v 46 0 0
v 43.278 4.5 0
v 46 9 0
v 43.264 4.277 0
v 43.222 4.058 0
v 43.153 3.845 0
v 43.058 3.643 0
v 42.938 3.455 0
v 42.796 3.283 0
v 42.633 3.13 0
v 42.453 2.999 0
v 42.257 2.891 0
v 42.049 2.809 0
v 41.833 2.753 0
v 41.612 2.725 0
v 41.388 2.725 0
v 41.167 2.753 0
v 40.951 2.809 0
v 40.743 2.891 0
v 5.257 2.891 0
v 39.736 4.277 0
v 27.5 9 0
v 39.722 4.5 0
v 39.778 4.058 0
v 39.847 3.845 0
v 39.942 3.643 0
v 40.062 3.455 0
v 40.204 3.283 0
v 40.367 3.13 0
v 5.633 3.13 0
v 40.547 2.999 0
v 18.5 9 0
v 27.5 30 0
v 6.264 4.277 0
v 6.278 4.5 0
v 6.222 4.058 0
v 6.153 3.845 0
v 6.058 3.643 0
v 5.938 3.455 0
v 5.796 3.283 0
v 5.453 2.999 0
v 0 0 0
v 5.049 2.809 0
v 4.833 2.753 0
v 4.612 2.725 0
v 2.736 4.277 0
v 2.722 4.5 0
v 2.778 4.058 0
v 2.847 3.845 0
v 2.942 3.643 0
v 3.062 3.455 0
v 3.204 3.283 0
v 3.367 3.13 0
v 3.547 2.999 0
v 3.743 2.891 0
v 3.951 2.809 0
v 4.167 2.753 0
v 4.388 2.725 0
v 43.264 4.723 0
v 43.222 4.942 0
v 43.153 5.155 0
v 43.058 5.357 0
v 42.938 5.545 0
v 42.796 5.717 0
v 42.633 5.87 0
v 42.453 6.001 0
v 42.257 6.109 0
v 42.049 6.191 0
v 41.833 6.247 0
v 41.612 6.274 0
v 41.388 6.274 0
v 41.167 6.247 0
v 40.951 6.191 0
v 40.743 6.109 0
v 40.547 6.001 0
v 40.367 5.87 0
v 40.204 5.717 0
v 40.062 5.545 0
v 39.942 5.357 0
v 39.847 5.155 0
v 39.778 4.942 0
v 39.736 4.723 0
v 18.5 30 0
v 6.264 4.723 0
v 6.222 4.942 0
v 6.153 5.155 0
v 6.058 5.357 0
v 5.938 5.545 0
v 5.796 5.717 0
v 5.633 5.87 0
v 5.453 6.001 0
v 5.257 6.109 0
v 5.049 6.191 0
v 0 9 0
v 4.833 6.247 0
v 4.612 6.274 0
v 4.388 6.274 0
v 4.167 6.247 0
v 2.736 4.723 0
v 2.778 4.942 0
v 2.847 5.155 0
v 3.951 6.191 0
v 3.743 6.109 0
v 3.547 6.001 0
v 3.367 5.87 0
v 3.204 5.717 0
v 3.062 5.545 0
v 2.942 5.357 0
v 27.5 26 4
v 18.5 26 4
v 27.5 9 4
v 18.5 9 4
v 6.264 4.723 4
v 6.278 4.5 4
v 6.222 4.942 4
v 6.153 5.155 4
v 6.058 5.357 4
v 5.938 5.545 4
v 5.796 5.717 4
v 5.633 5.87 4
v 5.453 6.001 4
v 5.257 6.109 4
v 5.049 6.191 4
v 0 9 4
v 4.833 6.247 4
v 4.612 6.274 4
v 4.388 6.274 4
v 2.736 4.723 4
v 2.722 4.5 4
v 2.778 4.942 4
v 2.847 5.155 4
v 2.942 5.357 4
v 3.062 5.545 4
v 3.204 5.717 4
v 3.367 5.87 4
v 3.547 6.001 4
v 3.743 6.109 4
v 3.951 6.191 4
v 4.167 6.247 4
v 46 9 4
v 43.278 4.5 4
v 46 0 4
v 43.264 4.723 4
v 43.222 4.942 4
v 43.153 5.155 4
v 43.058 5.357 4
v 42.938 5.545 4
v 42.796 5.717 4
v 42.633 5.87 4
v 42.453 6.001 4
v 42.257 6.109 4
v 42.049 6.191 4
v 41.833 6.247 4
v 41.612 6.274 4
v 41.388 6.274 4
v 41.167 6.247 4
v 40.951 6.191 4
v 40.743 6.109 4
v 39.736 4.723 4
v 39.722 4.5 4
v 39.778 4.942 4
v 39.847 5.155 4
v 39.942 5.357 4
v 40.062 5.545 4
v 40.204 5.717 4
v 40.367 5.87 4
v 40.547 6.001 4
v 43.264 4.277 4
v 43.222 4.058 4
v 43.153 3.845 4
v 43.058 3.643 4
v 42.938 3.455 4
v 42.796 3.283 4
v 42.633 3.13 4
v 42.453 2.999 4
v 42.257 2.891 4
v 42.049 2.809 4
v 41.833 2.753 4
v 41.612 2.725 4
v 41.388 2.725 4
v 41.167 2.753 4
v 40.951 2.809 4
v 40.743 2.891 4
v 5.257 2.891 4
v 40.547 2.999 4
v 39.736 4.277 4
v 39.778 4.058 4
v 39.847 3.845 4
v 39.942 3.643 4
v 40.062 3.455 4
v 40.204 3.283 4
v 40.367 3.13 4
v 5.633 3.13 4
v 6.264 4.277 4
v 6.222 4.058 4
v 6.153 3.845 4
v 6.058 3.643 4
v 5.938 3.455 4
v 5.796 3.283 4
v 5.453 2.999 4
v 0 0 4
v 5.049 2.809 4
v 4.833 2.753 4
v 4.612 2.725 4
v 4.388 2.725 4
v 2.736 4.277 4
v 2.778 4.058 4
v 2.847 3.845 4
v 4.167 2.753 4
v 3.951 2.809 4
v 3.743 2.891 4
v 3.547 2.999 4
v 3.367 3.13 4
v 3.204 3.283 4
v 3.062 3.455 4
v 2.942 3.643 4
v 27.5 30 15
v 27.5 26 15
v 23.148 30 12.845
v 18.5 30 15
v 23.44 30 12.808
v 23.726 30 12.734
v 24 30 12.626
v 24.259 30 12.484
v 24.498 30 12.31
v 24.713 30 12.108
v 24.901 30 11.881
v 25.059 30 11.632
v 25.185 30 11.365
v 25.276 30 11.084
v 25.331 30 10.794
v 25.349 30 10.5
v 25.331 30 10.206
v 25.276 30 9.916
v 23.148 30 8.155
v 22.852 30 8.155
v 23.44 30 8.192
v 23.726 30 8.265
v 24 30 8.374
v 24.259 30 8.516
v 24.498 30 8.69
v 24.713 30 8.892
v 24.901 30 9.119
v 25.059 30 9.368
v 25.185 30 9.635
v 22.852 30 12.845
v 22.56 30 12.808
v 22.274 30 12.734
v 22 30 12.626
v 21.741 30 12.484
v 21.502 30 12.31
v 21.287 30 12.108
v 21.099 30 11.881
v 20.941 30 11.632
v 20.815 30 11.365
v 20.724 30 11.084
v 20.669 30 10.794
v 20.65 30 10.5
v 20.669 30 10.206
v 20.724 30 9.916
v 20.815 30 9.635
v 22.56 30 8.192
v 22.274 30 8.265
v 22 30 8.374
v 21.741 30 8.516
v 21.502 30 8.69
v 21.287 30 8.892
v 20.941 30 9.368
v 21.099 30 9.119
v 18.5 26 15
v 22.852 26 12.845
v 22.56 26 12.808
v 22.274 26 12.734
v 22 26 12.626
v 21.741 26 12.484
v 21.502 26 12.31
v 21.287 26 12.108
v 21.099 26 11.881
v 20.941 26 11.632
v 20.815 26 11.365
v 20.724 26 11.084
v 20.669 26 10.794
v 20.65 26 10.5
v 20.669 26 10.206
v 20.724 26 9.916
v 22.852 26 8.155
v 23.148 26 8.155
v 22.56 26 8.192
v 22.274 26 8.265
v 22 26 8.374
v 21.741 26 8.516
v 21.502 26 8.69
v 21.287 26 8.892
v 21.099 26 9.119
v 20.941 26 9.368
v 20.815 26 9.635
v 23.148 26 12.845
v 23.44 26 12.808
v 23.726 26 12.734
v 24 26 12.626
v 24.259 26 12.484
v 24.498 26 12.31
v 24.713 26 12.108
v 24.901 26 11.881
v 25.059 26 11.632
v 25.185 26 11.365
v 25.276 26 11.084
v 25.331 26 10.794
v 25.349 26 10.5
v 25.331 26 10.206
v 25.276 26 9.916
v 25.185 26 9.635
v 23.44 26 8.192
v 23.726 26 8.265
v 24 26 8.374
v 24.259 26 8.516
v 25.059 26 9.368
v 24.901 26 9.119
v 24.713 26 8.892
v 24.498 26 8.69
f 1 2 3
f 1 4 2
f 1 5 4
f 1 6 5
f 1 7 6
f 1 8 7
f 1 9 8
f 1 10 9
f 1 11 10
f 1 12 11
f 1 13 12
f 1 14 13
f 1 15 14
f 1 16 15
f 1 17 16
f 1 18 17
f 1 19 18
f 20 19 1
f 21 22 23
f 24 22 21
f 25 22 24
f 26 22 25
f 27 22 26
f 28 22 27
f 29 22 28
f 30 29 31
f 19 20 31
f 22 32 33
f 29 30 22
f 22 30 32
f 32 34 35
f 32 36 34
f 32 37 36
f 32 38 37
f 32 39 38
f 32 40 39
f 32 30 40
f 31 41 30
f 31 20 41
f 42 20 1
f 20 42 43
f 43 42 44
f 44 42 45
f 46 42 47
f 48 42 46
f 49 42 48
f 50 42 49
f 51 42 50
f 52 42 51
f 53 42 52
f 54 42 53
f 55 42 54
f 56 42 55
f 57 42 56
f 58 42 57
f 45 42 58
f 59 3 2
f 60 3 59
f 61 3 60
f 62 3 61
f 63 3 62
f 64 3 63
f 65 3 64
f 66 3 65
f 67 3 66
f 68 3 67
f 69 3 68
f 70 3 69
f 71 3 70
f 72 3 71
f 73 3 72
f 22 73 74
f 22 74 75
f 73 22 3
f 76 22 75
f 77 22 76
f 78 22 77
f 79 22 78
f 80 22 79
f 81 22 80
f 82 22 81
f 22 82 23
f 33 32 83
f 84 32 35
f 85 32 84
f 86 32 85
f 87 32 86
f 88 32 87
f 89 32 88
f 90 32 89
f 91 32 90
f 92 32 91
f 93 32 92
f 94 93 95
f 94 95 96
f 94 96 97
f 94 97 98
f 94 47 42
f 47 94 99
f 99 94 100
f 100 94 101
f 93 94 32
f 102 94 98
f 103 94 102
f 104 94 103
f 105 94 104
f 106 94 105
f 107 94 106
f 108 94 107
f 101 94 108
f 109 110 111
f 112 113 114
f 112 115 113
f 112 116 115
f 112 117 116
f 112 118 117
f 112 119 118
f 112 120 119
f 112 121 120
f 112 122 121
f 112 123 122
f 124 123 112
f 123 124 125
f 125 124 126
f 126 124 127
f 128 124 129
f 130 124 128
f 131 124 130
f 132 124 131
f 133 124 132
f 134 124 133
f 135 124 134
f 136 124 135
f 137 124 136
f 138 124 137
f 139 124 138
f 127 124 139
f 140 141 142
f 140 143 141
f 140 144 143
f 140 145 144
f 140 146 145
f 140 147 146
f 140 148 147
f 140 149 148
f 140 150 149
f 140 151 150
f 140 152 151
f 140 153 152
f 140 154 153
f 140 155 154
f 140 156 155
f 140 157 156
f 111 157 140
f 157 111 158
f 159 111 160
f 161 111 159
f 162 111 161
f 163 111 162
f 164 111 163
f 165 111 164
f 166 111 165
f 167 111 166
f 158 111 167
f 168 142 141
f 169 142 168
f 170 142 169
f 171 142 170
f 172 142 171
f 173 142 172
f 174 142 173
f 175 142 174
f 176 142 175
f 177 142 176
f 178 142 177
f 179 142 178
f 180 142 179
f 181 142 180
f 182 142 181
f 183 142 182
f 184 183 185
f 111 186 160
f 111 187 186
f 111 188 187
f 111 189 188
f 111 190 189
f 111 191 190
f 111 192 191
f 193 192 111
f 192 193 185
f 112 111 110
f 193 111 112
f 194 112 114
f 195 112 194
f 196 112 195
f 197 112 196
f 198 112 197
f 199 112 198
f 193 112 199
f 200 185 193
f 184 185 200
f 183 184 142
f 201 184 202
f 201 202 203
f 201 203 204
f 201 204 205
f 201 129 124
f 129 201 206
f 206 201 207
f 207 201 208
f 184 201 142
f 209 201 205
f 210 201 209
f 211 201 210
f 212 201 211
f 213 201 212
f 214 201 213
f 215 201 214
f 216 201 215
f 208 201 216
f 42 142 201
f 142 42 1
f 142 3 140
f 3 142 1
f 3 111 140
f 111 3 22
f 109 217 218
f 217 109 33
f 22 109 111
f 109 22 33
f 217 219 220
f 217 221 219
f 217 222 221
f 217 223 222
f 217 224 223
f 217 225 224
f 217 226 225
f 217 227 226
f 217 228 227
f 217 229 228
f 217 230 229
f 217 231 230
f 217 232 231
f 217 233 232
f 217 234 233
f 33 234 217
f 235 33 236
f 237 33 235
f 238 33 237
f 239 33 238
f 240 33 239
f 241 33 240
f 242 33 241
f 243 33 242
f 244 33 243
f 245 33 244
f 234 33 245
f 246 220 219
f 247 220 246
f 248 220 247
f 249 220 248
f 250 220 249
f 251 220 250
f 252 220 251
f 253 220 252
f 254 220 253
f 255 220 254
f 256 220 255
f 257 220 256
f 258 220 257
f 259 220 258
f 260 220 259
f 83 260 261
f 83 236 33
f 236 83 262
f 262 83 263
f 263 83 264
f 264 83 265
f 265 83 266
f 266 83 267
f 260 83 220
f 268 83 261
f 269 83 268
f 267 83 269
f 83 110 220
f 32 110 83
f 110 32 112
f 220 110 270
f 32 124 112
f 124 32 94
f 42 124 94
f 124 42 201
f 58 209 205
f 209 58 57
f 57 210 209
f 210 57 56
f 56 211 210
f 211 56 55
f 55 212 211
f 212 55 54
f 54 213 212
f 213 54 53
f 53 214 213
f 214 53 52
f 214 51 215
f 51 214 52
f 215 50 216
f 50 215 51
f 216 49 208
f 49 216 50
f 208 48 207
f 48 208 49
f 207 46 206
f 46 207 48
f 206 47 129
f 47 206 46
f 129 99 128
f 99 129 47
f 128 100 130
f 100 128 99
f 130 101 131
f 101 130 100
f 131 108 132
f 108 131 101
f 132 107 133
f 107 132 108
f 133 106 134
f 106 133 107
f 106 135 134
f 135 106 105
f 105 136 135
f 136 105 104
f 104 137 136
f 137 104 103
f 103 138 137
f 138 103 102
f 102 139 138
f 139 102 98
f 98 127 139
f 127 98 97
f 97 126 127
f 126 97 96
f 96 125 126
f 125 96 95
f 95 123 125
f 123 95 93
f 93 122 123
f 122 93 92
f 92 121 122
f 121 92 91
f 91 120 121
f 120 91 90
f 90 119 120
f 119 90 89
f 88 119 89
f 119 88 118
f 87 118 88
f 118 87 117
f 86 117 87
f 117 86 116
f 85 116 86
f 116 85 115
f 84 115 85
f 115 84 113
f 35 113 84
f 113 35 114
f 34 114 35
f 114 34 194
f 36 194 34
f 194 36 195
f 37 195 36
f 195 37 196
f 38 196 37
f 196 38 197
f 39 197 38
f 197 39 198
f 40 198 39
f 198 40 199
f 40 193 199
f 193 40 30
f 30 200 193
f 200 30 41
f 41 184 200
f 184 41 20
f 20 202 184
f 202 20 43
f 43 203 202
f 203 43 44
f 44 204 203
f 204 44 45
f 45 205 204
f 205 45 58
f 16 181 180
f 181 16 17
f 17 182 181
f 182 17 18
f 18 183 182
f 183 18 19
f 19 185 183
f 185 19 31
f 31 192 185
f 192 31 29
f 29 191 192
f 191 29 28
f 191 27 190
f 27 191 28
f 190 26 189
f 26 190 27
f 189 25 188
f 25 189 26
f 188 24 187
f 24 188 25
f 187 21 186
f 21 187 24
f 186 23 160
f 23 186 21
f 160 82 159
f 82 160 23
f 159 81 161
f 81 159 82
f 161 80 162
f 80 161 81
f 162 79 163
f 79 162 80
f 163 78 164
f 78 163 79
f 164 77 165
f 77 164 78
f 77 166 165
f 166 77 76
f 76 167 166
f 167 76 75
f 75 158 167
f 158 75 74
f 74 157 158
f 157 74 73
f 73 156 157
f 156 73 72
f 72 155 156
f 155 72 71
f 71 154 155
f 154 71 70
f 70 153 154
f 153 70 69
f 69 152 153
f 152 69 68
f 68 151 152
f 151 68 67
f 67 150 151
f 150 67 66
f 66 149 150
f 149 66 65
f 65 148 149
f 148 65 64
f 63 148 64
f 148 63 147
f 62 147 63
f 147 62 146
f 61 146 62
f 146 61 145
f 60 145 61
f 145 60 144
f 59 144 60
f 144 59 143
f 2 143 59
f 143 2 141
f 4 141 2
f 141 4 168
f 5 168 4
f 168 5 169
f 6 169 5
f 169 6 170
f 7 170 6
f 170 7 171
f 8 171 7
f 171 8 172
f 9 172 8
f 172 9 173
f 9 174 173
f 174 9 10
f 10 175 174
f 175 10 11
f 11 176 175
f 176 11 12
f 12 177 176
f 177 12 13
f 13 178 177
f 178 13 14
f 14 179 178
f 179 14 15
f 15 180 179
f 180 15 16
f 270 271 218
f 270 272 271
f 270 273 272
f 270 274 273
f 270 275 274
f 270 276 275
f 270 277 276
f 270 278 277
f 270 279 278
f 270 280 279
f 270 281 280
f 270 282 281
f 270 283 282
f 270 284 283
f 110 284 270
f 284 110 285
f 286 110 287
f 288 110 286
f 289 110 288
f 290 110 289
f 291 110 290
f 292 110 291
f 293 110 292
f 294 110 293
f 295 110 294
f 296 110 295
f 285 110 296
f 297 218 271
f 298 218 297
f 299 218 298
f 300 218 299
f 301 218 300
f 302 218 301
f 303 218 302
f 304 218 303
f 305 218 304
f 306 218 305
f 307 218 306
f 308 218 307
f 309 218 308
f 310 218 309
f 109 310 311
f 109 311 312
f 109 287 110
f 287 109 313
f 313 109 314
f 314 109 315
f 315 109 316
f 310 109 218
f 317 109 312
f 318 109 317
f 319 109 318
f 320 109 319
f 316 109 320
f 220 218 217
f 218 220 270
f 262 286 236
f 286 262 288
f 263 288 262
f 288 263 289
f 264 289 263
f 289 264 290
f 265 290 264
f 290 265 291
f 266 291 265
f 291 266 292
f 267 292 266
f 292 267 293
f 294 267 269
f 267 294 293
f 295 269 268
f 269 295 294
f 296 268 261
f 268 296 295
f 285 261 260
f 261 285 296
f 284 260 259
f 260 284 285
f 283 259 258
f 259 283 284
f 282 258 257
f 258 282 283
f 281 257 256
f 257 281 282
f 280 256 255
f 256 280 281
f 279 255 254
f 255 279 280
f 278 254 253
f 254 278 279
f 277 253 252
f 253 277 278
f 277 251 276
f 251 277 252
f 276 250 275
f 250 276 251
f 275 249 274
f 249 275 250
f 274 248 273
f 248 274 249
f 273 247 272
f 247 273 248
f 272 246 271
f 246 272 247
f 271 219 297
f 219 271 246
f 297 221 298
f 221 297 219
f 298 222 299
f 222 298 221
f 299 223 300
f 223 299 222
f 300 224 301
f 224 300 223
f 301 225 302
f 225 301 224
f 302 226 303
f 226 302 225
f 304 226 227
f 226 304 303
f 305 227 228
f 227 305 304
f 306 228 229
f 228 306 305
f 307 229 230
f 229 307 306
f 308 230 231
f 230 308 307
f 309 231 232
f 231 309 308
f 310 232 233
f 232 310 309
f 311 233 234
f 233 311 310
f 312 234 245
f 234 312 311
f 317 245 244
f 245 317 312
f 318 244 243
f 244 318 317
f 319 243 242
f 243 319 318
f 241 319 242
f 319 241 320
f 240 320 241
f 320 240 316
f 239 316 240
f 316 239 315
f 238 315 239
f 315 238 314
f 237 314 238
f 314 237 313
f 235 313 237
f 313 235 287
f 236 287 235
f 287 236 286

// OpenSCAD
$fn = 50;

inches_to_mm = 25.4;

hole_1_diameter = 0.185*inches_to_mm;
hole_2_diameter = 0.140*inches_to_mm;
sensor_hole_center = 37;
support_height = 9;
sensor_height = 21;
bracket_length = 15;
bracket_thickness = 4;

// -------------------------- part --------------------

distance_sensor_bracket();

// ------------------------- module definition ----------------

module distance_sensor_bracket()
{
  linear_extrude(height = bracket_thickness) union()
  {
    difference()
    {
      square([support_height+sensor_hole_center, support_height]);
      translate([support_height/2, support_height/2]) circle(r=hole_2_diameter/2);
      translate([support_height/2+sensor_hole_center, support_height/2]) circle(r=hole_2_diameter/2);
    }
    
    translate([sensor_hole_center/2, support_height]) square([support_height, sensor_height]);
  }
  
  translate([sensor_hole_center/2, support_height+sensor_height,0]) rotate([90,0,0]) linear_extrude(height = bracket_thickness) difference()
  {
    square([support_height, bracket_length]);
    translate([support_height/2, bracket_length-support_height/2]) circle(r=hole_1_diameter/2);
  }
}
